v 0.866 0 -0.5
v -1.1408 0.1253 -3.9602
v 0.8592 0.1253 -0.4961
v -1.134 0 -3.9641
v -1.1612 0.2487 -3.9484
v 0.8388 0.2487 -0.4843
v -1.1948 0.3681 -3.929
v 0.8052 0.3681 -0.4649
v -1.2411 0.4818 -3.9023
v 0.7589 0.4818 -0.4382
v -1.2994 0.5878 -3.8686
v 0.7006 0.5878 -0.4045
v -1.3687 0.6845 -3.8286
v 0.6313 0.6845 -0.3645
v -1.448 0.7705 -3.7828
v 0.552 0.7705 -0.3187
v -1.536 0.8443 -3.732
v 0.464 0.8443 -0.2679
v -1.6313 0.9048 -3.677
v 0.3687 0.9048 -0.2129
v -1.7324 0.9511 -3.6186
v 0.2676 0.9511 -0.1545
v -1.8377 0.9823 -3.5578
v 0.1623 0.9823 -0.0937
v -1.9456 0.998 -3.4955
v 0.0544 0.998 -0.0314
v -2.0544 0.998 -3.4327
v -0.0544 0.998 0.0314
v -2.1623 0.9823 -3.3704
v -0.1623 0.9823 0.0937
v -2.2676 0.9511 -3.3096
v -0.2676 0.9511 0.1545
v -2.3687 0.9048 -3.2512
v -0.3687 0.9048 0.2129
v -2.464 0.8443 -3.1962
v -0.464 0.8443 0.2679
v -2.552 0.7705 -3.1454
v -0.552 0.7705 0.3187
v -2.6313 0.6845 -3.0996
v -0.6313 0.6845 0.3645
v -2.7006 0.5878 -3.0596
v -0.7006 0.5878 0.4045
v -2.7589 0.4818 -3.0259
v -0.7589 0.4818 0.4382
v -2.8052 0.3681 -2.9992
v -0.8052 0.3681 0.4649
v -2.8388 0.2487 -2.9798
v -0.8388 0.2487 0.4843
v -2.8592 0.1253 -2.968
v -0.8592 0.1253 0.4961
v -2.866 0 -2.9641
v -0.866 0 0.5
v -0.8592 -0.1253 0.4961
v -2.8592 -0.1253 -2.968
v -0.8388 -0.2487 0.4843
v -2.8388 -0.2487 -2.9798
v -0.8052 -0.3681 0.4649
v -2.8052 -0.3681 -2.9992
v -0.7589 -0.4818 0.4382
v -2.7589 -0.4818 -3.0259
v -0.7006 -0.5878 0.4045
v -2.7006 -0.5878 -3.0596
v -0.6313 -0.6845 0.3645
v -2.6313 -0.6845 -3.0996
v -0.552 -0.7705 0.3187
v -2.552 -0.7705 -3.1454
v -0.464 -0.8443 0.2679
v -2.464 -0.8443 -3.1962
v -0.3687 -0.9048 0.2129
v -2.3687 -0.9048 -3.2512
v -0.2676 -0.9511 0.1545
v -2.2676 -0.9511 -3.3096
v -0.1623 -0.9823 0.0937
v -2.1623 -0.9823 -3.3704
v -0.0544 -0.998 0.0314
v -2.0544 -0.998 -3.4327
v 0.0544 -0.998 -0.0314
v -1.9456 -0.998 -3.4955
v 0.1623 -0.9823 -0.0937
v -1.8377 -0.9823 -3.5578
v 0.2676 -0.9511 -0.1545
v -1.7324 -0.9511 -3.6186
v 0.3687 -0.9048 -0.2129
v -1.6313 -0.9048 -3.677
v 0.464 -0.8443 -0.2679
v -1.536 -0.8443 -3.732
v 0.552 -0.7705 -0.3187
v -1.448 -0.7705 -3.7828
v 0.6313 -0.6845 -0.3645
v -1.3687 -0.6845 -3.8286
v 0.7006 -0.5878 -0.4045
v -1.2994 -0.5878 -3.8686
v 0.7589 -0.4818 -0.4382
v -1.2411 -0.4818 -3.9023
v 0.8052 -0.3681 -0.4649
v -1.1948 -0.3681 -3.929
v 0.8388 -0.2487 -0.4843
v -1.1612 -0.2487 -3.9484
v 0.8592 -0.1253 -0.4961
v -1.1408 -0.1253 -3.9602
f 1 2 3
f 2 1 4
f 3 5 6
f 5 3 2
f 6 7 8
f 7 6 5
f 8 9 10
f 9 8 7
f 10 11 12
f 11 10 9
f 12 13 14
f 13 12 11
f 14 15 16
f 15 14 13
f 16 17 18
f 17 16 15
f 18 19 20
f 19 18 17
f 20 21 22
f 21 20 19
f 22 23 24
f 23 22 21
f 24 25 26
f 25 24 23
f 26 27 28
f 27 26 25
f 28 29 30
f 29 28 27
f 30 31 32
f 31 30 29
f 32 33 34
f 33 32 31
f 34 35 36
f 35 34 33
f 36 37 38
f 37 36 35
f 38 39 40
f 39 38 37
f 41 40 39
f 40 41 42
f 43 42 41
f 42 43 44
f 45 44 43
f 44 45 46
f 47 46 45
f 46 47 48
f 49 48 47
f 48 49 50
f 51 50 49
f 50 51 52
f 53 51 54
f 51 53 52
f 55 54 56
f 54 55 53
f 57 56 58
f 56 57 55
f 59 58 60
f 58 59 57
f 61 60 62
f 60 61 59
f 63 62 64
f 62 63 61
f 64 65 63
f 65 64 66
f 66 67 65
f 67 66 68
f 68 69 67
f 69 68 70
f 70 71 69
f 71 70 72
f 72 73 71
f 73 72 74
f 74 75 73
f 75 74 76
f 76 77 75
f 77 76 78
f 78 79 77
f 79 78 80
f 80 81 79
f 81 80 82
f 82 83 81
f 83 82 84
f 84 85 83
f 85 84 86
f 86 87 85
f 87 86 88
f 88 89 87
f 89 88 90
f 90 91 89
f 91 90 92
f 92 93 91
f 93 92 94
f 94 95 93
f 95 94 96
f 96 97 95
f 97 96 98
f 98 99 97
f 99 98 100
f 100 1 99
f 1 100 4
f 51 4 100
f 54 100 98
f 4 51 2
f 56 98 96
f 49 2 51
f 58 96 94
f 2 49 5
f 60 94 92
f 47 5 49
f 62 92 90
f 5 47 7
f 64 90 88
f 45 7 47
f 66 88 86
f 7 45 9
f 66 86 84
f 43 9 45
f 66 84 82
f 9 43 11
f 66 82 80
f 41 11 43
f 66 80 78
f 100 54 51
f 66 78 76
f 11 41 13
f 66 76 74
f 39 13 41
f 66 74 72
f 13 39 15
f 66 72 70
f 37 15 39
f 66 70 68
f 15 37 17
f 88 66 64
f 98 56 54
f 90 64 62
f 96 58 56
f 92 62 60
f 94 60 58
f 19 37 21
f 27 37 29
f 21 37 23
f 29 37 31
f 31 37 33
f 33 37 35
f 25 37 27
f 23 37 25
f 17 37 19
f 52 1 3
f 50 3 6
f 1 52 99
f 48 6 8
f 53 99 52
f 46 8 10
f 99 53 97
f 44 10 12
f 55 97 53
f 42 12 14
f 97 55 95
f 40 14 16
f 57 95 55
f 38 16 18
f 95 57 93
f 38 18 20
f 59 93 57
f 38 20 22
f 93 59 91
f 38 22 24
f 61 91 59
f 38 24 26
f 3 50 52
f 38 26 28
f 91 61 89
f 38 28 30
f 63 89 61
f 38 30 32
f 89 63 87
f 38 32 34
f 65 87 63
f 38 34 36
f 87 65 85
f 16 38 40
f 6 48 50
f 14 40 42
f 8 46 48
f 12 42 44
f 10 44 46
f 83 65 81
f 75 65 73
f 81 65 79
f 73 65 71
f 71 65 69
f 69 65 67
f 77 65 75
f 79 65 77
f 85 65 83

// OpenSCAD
$fn = 50;
// body
*cylinder(h = 10, r1 = 4, r2 = 0);

// head
*translate([0, 0, 9]) sphere(r=2.5);

// arms
rotate(a=30, v=[0,1,0]) translate([0, 0, -4]) cylinder(h = 4, r = 1);
